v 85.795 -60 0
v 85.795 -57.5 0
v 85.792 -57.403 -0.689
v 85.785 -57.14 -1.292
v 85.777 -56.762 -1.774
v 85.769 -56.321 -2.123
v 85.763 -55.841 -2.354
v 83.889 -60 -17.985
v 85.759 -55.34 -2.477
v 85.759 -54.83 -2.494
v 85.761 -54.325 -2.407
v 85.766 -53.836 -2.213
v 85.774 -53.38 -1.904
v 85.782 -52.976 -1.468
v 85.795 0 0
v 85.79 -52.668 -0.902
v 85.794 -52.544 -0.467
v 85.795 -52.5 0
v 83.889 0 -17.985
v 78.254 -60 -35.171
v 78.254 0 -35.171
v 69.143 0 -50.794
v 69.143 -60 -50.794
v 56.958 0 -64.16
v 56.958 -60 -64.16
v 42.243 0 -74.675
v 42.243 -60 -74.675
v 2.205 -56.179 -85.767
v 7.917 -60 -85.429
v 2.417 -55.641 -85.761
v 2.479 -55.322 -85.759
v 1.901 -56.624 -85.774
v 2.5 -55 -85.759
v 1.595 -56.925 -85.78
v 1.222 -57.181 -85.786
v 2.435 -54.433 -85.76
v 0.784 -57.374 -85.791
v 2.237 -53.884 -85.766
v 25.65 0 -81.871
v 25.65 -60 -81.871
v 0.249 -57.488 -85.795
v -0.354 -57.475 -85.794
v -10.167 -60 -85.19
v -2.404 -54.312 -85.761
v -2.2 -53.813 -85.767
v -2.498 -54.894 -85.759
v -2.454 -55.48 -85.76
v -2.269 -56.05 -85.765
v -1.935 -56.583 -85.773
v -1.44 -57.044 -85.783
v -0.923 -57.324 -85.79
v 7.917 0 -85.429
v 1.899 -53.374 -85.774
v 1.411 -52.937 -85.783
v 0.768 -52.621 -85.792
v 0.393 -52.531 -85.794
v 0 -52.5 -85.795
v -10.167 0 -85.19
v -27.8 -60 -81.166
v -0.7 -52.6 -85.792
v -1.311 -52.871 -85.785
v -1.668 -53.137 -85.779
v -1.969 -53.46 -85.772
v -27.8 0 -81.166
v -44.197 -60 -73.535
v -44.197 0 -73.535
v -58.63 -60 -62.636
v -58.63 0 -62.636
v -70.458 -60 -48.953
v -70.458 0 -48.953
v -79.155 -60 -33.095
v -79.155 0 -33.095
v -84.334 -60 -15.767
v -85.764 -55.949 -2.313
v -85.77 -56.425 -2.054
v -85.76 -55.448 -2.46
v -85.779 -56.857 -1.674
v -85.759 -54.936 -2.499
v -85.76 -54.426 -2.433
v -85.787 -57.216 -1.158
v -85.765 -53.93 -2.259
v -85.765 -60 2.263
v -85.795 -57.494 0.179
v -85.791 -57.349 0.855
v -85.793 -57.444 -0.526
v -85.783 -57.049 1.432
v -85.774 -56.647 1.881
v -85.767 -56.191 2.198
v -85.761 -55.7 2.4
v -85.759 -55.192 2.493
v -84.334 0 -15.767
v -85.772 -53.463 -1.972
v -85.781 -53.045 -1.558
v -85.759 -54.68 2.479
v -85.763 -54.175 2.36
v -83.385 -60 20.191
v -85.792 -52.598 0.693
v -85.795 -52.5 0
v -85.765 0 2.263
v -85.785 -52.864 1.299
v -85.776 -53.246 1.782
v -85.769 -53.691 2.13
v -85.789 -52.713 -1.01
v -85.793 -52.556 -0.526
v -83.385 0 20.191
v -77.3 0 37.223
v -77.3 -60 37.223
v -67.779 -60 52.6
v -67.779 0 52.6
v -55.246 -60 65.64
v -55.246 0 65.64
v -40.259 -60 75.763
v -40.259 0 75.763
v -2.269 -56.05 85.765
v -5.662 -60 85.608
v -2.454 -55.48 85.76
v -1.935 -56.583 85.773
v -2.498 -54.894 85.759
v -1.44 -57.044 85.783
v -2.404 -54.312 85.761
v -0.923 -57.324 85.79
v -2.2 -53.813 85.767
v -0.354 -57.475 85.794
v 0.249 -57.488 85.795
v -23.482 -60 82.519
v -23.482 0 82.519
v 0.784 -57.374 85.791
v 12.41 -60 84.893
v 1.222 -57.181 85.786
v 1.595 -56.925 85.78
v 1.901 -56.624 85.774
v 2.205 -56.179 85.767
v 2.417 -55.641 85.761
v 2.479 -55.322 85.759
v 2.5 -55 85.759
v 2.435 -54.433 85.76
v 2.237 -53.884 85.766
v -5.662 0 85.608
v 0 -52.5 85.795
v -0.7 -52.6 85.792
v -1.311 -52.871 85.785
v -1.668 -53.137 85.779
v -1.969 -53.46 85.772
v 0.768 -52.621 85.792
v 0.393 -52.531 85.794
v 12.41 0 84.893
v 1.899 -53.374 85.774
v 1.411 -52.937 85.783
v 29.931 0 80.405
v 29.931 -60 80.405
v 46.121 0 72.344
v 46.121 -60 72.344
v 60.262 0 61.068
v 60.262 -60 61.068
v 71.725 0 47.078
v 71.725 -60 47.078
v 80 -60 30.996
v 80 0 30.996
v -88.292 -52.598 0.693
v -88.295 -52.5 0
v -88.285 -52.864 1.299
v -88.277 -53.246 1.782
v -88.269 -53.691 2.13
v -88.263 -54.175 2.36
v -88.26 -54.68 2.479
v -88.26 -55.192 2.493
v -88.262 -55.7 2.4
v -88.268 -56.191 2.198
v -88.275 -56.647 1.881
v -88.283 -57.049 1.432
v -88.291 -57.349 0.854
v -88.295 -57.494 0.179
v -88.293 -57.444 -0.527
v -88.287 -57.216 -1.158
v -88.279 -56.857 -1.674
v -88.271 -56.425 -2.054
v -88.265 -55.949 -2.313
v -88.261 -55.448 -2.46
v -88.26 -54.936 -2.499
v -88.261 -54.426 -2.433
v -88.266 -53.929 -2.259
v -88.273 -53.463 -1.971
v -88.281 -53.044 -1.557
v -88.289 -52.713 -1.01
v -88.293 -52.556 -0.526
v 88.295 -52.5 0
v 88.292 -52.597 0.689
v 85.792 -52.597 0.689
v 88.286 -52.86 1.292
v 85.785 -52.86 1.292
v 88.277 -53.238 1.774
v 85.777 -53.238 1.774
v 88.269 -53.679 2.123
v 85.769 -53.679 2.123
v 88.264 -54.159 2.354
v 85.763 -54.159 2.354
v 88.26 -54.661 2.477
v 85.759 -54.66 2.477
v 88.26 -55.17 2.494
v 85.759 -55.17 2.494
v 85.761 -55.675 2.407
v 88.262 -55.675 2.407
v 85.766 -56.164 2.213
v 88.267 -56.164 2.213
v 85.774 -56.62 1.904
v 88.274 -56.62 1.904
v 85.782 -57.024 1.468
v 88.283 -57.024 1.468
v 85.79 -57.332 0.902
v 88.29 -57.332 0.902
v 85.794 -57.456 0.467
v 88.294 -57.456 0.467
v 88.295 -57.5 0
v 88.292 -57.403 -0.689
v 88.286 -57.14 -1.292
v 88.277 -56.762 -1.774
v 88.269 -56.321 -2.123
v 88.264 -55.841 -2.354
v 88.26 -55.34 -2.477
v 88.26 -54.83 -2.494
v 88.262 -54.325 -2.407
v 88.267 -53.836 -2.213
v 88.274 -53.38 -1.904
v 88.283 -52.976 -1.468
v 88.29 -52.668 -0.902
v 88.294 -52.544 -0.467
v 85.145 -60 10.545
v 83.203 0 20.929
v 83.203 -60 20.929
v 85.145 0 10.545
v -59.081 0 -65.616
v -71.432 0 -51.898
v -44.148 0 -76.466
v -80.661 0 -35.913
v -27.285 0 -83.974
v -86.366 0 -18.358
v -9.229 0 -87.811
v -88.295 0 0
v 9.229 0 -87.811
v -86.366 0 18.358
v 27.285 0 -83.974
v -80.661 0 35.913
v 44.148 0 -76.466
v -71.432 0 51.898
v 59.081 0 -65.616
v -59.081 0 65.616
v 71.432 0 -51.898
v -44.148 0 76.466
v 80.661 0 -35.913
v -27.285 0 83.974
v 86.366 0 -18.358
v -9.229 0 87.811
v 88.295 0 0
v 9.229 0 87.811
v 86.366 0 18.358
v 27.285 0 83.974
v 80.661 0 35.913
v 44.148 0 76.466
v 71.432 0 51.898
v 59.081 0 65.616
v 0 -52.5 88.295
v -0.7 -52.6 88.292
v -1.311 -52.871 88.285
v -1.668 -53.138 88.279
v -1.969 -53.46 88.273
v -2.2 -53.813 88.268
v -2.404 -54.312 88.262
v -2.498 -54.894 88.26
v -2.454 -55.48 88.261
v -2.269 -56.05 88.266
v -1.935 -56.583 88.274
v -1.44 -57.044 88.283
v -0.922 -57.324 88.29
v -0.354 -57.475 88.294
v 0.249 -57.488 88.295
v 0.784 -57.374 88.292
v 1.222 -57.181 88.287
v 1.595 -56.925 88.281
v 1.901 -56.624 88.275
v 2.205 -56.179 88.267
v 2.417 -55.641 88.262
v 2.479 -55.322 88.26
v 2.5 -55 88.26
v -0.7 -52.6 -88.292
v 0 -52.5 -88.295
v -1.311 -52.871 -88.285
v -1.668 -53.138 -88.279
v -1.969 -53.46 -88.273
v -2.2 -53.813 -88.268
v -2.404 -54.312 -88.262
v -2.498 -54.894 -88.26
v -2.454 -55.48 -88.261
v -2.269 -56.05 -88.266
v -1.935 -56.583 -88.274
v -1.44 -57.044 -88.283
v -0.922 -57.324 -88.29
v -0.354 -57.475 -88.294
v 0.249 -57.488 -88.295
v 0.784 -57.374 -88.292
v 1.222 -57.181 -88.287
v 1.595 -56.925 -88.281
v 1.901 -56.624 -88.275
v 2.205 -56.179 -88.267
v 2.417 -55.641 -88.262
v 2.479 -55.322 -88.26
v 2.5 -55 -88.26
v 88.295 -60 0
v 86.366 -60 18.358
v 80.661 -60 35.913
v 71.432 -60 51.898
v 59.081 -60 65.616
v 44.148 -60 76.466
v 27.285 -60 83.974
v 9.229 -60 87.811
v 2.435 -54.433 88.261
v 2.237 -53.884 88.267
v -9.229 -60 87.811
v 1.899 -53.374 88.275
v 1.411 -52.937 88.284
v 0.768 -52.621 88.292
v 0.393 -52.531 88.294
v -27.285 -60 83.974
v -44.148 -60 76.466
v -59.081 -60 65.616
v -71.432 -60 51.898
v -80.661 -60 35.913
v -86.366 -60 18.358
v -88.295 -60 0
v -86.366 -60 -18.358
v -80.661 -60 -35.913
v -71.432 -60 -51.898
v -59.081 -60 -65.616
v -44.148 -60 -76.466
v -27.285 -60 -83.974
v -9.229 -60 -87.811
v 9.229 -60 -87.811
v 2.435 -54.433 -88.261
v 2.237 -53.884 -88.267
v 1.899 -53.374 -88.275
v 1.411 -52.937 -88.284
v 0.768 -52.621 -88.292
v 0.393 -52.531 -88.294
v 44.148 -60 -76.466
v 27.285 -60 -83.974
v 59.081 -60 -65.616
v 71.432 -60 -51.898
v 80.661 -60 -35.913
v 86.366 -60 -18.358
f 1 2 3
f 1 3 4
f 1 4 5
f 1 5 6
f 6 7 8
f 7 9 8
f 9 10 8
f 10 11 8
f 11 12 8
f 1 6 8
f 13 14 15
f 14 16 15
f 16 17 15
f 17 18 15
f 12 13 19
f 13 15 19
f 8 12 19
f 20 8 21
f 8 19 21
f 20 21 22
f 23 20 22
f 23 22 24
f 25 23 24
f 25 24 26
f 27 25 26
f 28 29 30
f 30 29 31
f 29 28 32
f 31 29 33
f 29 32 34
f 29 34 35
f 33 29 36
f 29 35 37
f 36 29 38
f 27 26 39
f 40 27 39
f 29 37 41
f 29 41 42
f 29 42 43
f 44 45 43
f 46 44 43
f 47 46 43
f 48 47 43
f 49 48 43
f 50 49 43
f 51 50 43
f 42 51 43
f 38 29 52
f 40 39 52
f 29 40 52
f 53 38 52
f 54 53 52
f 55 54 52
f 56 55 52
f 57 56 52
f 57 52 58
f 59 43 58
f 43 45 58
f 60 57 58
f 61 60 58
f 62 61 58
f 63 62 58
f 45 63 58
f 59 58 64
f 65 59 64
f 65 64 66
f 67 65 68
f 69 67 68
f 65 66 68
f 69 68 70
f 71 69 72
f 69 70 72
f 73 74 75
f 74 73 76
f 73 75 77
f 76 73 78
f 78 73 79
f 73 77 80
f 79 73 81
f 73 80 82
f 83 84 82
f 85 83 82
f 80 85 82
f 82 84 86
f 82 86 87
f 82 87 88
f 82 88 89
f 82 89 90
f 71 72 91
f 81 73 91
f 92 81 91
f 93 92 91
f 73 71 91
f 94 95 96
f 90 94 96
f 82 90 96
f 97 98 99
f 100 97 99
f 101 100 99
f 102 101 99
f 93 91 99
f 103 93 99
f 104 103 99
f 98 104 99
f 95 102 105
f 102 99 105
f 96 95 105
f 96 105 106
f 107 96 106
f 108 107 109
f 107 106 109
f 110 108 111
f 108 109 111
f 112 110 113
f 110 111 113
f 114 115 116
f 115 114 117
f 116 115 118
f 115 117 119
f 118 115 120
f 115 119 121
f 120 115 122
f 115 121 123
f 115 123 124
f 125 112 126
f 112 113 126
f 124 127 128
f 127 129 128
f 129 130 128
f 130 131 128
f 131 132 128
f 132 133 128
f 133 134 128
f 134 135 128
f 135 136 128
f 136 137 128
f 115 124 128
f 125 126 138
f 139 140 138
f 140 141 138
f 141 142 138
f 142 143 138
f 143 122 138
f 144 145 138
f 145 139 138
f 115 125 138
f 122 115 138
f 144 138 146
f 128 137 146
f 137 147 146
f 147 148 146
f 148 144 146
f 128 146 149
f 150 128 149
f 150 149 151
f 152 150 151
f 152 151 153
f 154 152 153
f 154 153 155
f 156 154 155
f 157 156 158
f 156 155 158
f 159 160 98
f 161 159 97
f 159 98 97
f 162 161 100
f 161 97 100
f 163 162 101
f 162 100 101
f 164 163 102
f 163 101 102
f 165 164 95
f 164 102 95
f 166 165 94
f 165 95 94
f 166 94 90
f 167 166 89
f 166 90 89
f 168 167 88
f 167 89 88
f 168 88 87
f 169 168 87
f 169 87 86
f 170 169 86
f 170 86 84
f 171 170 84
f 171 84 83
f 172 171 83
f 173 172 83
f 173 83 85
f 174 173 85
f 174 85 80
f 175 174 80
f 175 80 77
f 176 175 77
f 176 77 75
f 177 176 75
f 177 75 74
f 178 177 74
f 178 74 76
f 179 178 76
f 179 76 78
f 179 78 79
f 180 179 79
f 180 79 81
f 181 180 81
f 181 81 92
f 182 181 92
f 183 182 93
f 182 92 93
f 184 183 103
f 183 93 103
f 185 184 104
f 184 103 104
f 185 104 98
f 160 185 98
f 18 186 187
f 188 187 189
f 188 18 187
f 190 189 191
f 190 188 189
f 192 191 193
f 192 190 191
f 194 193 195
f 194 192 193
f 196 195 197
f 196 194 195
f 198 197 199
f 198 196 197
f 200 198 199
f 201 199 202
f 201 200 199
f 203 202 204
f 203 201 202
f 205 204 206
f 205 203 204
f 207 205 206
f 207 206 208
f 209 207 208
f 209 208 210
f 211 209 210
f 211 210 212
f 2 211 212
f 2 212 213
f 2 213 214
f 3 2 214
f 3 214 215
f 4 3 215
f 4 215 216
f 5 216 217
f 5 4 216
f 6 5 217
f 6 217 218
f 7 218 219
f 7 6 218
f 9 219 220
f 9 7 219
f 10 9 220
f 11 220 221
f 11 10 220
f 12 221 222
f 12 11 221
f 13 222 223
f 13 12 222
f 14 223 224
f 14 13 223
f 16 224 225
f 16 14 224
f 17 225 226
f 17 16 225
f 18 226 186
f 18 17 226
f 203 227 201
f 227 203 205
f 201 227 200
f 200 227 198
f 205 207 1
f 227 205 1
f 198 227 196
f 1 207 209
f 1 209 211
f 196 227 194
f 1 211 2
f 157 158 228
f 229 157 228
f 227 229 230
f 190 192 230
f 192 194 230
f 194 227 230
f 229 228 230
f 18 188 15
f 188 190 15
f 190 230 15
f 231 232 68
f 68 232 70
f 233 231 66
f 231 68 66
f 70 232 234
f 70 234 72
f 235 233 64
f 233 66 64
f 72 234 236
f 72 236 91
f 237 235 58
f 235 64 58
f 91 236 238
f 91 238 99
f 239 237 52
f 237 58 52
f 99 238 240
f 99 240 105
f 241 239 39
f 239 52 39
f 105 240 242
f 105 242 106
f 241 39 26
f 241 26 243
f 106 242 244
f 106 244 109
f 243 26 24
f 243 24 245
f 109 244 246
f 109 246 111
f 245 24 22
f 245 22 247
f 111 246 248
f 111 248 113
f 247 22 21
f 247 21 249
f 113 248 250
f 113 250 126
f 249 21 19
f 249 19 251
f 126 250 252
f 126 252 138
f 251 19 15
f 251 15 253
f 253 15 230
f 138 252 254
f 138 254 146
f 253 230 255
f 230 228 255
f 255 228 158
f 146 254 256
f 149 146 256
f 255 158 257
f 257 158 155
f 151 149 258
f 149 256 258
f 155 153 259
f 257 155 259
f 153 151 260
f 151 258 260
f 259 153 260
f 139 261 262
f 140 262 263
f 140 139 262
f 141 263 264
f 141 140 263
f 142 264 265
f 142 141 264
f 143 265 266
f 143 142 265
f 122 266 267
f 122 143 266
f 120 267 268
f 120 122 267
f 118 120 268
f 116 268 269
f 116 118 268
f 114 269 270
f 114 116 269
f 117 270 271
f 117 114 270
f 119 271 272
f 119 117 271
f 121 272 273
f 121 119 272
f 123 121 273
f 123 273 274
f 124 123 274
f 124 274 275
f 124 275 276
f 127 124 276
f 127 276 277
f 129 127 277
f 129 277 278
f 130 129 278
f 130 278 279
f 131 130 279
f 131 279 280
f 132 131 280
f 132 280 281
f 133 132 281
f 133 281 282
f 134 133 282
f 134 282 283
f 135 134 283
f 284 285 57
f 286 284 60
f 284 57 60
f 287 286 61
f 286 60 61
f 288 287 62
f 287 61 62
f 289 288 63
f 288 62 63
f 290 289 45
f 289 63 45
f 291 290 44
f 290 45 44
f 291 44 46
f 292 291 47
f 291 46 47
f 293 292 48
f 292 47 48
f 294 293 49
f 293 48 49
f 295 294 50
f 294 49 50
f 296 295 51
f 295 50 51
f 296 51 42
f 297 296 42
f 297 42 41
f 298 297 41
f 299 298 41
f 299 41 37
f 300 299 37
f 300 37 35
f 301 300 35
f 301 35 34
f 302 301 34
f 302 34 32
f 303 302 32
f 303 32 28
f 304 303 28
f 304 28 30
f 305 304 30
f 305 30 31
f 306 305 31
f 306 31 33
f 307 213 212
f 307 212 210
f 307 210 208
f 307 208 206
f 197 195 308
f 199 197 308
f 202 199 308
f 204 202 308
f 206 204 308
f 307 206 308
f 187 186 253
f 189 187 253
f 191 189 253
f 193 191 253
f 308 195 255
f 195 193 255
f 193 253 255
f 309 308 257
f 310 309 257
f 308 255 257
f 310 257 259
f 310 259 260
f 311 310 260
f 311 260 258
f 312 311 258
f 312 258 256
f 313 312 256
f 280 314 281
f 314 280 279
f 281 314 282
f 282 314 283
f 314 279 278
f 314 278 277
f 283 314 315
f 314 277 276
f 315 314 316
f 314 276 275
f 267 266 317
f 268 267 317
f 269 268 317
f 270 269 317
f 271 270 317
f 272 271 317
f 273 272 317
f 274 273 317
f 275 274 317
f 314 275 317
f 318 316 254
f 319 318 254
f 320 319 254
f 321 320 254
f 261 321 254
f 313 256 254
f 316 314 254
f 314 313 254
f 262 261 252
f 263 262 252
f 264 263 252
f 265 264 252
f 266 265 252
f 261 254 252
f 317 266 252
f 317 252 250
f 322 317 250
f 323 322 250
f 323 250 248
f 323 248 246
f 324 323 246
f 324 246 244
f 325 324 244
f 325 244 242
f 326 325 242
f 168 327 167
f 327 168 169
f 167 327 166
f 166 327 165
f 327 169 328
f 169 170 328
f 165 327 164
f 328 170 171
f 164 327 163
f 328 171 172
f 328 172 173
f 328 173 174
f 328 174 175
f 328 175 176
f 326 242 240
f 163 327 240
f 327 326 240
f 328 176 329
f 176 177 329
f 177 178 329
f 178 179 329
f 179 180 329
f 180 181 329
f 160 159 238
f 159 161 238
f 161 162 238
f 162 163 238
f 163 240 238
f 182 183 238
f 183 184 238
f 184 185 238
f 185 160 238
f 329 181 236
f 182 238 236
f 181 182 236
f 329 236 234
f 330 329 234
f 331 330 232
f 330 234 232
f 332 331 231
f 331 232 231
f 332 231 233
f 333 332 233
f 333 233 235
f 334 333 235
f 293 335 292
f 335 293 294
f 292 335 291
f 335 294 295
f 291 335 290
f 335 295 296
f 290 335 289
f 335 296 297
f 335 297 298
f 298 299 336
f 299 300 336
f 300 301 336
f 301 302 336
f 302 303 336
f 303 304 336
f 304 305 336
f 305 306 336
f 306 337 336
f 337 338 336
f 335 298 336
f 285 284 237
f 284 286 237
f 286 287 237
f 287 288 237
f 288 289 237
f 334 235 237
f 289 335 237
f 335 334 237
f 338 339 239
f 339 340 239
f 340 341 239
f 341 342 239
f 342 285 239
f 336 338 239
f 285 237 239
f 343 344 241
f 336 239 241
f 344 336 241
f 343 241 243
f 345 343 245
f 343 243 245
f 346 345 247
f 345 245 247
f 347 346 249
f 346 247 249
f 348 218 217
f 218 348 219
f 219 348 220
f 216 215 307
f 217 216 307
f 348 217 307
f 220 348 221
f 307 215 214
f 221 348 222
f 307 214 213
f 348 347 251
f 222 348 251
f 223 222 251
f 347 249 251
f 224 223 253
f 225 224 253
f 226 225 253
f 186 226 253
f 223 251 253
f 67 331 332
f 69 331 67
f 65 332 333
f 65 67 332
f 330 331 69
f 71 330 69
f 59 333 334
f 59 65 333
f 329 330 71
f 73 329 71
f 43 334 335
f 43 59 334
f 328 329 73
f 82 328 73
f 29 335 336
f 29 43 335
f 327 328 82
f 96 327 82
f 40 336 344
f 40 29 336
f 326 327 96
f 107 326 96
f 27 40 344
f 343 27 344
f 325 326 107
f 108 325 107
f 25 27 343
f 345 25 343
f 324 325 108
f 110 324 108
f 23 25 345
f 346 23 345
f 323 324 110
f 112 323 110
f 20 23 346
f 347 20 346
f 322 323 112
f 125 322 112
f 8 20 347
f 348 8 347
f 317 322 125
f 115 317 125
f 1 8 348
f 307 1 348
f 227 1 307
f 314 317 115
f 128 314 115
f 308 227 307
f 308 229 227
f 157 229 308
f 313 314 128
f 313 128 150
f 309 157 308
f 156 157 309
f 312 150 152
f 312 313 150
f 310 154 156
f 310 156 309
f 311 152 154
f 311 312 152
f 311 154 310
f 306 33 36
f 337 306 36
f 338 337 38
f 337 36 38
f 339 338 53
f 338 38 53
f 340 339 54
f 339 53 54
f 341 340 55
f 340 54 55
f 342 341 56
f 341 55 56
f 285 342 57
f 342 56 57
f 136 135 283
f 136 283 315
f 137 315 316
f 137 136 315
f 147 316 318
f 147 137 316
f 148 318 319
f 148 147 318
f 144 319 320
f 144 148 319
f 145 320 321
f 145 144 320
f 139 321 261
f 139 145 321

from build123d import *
from build123d import SkipClean  # not in build123d's __all__

# Parameters (mm, degrees)
F0_R     = 88.295
F1_DEPTH = 60
F2_R     = 2.5
F3_DEPTH = 300
F4_DEPTH = 300
F6_DEPTH = 300
F7_DEPTH = 300


with BuildPart() as f1:
    # F0 (on Front) → F1 (new body)
    with BuildSketch(Plane.XZ):
        Circle(F0_R)
        with BuildLine():
            ThreePointArc((80, 30.9964840748), (84.3338070557, 15.7667692474), (85.795, 0))
            ThreePointArc((85.795, 0), (-84.3338070557, -15.7667692474), (80, 30.9964840748))
        make_face(mode=Mode.SUBTRACT)
    extrude(amount=F1_DEPTH)

    # F2 (on Right) → F3 (cut)
    with BuildSketch(Plane.YZ):
        with Locations((-55, 0)):
            Circle(F2_R)
    extrude(amount=-F3_DEPTH, mode=Mode.SUBTRACT)

    # F2 (on Right) → F4 (cut)
    with BuildSketch(Plane.YZ):
        with Locations((-55, 0)):
            Circle(F2_R)
    with SkipClean():  # cleaning this boolean's faces spoils the solid; the shape is the same uncleaned
        extrude(amount=F4_DEPTH, mode=Mode.SUBTRACT)

    # F5 (on Top) → F6 (cut)
    with BuildSketch(Plane.XY):
        with BuildLine():
            ThreePointArc((0, -52.5), (-1.767766953, -56.767766953), (2.5, -55))
            ThreePointArc((2.5, -55), (1.767766953, -53.232233047), (0, -52.5))
        make_face()
    with SkipClean():  # cleaning this boolean's faces spoils the solid; the shape is the same uncleaned
        extrude(amount=-F6_DEPTH, mode=Mode.SUBTRACT)

    # F5 (on Top) → F7 (cut)
    with BuildSketch(Plane.XY):
        with BuildLine():
            ThreePointArc((0, -52.5), (-1.767766953, -56.767766953), (2.5, -55))
            ThreePointArc((2.5, -55), (1.767766953, -53.232233047), (0, -52.5))
        make_face()
    with SkipClean():  # cleaning this boolean's faces spoils the solid; the shape is the same uncleaned
        extrude(amount=F7_DEPTH, mode=Mode.SUBTRACT)


solid = f1.part
